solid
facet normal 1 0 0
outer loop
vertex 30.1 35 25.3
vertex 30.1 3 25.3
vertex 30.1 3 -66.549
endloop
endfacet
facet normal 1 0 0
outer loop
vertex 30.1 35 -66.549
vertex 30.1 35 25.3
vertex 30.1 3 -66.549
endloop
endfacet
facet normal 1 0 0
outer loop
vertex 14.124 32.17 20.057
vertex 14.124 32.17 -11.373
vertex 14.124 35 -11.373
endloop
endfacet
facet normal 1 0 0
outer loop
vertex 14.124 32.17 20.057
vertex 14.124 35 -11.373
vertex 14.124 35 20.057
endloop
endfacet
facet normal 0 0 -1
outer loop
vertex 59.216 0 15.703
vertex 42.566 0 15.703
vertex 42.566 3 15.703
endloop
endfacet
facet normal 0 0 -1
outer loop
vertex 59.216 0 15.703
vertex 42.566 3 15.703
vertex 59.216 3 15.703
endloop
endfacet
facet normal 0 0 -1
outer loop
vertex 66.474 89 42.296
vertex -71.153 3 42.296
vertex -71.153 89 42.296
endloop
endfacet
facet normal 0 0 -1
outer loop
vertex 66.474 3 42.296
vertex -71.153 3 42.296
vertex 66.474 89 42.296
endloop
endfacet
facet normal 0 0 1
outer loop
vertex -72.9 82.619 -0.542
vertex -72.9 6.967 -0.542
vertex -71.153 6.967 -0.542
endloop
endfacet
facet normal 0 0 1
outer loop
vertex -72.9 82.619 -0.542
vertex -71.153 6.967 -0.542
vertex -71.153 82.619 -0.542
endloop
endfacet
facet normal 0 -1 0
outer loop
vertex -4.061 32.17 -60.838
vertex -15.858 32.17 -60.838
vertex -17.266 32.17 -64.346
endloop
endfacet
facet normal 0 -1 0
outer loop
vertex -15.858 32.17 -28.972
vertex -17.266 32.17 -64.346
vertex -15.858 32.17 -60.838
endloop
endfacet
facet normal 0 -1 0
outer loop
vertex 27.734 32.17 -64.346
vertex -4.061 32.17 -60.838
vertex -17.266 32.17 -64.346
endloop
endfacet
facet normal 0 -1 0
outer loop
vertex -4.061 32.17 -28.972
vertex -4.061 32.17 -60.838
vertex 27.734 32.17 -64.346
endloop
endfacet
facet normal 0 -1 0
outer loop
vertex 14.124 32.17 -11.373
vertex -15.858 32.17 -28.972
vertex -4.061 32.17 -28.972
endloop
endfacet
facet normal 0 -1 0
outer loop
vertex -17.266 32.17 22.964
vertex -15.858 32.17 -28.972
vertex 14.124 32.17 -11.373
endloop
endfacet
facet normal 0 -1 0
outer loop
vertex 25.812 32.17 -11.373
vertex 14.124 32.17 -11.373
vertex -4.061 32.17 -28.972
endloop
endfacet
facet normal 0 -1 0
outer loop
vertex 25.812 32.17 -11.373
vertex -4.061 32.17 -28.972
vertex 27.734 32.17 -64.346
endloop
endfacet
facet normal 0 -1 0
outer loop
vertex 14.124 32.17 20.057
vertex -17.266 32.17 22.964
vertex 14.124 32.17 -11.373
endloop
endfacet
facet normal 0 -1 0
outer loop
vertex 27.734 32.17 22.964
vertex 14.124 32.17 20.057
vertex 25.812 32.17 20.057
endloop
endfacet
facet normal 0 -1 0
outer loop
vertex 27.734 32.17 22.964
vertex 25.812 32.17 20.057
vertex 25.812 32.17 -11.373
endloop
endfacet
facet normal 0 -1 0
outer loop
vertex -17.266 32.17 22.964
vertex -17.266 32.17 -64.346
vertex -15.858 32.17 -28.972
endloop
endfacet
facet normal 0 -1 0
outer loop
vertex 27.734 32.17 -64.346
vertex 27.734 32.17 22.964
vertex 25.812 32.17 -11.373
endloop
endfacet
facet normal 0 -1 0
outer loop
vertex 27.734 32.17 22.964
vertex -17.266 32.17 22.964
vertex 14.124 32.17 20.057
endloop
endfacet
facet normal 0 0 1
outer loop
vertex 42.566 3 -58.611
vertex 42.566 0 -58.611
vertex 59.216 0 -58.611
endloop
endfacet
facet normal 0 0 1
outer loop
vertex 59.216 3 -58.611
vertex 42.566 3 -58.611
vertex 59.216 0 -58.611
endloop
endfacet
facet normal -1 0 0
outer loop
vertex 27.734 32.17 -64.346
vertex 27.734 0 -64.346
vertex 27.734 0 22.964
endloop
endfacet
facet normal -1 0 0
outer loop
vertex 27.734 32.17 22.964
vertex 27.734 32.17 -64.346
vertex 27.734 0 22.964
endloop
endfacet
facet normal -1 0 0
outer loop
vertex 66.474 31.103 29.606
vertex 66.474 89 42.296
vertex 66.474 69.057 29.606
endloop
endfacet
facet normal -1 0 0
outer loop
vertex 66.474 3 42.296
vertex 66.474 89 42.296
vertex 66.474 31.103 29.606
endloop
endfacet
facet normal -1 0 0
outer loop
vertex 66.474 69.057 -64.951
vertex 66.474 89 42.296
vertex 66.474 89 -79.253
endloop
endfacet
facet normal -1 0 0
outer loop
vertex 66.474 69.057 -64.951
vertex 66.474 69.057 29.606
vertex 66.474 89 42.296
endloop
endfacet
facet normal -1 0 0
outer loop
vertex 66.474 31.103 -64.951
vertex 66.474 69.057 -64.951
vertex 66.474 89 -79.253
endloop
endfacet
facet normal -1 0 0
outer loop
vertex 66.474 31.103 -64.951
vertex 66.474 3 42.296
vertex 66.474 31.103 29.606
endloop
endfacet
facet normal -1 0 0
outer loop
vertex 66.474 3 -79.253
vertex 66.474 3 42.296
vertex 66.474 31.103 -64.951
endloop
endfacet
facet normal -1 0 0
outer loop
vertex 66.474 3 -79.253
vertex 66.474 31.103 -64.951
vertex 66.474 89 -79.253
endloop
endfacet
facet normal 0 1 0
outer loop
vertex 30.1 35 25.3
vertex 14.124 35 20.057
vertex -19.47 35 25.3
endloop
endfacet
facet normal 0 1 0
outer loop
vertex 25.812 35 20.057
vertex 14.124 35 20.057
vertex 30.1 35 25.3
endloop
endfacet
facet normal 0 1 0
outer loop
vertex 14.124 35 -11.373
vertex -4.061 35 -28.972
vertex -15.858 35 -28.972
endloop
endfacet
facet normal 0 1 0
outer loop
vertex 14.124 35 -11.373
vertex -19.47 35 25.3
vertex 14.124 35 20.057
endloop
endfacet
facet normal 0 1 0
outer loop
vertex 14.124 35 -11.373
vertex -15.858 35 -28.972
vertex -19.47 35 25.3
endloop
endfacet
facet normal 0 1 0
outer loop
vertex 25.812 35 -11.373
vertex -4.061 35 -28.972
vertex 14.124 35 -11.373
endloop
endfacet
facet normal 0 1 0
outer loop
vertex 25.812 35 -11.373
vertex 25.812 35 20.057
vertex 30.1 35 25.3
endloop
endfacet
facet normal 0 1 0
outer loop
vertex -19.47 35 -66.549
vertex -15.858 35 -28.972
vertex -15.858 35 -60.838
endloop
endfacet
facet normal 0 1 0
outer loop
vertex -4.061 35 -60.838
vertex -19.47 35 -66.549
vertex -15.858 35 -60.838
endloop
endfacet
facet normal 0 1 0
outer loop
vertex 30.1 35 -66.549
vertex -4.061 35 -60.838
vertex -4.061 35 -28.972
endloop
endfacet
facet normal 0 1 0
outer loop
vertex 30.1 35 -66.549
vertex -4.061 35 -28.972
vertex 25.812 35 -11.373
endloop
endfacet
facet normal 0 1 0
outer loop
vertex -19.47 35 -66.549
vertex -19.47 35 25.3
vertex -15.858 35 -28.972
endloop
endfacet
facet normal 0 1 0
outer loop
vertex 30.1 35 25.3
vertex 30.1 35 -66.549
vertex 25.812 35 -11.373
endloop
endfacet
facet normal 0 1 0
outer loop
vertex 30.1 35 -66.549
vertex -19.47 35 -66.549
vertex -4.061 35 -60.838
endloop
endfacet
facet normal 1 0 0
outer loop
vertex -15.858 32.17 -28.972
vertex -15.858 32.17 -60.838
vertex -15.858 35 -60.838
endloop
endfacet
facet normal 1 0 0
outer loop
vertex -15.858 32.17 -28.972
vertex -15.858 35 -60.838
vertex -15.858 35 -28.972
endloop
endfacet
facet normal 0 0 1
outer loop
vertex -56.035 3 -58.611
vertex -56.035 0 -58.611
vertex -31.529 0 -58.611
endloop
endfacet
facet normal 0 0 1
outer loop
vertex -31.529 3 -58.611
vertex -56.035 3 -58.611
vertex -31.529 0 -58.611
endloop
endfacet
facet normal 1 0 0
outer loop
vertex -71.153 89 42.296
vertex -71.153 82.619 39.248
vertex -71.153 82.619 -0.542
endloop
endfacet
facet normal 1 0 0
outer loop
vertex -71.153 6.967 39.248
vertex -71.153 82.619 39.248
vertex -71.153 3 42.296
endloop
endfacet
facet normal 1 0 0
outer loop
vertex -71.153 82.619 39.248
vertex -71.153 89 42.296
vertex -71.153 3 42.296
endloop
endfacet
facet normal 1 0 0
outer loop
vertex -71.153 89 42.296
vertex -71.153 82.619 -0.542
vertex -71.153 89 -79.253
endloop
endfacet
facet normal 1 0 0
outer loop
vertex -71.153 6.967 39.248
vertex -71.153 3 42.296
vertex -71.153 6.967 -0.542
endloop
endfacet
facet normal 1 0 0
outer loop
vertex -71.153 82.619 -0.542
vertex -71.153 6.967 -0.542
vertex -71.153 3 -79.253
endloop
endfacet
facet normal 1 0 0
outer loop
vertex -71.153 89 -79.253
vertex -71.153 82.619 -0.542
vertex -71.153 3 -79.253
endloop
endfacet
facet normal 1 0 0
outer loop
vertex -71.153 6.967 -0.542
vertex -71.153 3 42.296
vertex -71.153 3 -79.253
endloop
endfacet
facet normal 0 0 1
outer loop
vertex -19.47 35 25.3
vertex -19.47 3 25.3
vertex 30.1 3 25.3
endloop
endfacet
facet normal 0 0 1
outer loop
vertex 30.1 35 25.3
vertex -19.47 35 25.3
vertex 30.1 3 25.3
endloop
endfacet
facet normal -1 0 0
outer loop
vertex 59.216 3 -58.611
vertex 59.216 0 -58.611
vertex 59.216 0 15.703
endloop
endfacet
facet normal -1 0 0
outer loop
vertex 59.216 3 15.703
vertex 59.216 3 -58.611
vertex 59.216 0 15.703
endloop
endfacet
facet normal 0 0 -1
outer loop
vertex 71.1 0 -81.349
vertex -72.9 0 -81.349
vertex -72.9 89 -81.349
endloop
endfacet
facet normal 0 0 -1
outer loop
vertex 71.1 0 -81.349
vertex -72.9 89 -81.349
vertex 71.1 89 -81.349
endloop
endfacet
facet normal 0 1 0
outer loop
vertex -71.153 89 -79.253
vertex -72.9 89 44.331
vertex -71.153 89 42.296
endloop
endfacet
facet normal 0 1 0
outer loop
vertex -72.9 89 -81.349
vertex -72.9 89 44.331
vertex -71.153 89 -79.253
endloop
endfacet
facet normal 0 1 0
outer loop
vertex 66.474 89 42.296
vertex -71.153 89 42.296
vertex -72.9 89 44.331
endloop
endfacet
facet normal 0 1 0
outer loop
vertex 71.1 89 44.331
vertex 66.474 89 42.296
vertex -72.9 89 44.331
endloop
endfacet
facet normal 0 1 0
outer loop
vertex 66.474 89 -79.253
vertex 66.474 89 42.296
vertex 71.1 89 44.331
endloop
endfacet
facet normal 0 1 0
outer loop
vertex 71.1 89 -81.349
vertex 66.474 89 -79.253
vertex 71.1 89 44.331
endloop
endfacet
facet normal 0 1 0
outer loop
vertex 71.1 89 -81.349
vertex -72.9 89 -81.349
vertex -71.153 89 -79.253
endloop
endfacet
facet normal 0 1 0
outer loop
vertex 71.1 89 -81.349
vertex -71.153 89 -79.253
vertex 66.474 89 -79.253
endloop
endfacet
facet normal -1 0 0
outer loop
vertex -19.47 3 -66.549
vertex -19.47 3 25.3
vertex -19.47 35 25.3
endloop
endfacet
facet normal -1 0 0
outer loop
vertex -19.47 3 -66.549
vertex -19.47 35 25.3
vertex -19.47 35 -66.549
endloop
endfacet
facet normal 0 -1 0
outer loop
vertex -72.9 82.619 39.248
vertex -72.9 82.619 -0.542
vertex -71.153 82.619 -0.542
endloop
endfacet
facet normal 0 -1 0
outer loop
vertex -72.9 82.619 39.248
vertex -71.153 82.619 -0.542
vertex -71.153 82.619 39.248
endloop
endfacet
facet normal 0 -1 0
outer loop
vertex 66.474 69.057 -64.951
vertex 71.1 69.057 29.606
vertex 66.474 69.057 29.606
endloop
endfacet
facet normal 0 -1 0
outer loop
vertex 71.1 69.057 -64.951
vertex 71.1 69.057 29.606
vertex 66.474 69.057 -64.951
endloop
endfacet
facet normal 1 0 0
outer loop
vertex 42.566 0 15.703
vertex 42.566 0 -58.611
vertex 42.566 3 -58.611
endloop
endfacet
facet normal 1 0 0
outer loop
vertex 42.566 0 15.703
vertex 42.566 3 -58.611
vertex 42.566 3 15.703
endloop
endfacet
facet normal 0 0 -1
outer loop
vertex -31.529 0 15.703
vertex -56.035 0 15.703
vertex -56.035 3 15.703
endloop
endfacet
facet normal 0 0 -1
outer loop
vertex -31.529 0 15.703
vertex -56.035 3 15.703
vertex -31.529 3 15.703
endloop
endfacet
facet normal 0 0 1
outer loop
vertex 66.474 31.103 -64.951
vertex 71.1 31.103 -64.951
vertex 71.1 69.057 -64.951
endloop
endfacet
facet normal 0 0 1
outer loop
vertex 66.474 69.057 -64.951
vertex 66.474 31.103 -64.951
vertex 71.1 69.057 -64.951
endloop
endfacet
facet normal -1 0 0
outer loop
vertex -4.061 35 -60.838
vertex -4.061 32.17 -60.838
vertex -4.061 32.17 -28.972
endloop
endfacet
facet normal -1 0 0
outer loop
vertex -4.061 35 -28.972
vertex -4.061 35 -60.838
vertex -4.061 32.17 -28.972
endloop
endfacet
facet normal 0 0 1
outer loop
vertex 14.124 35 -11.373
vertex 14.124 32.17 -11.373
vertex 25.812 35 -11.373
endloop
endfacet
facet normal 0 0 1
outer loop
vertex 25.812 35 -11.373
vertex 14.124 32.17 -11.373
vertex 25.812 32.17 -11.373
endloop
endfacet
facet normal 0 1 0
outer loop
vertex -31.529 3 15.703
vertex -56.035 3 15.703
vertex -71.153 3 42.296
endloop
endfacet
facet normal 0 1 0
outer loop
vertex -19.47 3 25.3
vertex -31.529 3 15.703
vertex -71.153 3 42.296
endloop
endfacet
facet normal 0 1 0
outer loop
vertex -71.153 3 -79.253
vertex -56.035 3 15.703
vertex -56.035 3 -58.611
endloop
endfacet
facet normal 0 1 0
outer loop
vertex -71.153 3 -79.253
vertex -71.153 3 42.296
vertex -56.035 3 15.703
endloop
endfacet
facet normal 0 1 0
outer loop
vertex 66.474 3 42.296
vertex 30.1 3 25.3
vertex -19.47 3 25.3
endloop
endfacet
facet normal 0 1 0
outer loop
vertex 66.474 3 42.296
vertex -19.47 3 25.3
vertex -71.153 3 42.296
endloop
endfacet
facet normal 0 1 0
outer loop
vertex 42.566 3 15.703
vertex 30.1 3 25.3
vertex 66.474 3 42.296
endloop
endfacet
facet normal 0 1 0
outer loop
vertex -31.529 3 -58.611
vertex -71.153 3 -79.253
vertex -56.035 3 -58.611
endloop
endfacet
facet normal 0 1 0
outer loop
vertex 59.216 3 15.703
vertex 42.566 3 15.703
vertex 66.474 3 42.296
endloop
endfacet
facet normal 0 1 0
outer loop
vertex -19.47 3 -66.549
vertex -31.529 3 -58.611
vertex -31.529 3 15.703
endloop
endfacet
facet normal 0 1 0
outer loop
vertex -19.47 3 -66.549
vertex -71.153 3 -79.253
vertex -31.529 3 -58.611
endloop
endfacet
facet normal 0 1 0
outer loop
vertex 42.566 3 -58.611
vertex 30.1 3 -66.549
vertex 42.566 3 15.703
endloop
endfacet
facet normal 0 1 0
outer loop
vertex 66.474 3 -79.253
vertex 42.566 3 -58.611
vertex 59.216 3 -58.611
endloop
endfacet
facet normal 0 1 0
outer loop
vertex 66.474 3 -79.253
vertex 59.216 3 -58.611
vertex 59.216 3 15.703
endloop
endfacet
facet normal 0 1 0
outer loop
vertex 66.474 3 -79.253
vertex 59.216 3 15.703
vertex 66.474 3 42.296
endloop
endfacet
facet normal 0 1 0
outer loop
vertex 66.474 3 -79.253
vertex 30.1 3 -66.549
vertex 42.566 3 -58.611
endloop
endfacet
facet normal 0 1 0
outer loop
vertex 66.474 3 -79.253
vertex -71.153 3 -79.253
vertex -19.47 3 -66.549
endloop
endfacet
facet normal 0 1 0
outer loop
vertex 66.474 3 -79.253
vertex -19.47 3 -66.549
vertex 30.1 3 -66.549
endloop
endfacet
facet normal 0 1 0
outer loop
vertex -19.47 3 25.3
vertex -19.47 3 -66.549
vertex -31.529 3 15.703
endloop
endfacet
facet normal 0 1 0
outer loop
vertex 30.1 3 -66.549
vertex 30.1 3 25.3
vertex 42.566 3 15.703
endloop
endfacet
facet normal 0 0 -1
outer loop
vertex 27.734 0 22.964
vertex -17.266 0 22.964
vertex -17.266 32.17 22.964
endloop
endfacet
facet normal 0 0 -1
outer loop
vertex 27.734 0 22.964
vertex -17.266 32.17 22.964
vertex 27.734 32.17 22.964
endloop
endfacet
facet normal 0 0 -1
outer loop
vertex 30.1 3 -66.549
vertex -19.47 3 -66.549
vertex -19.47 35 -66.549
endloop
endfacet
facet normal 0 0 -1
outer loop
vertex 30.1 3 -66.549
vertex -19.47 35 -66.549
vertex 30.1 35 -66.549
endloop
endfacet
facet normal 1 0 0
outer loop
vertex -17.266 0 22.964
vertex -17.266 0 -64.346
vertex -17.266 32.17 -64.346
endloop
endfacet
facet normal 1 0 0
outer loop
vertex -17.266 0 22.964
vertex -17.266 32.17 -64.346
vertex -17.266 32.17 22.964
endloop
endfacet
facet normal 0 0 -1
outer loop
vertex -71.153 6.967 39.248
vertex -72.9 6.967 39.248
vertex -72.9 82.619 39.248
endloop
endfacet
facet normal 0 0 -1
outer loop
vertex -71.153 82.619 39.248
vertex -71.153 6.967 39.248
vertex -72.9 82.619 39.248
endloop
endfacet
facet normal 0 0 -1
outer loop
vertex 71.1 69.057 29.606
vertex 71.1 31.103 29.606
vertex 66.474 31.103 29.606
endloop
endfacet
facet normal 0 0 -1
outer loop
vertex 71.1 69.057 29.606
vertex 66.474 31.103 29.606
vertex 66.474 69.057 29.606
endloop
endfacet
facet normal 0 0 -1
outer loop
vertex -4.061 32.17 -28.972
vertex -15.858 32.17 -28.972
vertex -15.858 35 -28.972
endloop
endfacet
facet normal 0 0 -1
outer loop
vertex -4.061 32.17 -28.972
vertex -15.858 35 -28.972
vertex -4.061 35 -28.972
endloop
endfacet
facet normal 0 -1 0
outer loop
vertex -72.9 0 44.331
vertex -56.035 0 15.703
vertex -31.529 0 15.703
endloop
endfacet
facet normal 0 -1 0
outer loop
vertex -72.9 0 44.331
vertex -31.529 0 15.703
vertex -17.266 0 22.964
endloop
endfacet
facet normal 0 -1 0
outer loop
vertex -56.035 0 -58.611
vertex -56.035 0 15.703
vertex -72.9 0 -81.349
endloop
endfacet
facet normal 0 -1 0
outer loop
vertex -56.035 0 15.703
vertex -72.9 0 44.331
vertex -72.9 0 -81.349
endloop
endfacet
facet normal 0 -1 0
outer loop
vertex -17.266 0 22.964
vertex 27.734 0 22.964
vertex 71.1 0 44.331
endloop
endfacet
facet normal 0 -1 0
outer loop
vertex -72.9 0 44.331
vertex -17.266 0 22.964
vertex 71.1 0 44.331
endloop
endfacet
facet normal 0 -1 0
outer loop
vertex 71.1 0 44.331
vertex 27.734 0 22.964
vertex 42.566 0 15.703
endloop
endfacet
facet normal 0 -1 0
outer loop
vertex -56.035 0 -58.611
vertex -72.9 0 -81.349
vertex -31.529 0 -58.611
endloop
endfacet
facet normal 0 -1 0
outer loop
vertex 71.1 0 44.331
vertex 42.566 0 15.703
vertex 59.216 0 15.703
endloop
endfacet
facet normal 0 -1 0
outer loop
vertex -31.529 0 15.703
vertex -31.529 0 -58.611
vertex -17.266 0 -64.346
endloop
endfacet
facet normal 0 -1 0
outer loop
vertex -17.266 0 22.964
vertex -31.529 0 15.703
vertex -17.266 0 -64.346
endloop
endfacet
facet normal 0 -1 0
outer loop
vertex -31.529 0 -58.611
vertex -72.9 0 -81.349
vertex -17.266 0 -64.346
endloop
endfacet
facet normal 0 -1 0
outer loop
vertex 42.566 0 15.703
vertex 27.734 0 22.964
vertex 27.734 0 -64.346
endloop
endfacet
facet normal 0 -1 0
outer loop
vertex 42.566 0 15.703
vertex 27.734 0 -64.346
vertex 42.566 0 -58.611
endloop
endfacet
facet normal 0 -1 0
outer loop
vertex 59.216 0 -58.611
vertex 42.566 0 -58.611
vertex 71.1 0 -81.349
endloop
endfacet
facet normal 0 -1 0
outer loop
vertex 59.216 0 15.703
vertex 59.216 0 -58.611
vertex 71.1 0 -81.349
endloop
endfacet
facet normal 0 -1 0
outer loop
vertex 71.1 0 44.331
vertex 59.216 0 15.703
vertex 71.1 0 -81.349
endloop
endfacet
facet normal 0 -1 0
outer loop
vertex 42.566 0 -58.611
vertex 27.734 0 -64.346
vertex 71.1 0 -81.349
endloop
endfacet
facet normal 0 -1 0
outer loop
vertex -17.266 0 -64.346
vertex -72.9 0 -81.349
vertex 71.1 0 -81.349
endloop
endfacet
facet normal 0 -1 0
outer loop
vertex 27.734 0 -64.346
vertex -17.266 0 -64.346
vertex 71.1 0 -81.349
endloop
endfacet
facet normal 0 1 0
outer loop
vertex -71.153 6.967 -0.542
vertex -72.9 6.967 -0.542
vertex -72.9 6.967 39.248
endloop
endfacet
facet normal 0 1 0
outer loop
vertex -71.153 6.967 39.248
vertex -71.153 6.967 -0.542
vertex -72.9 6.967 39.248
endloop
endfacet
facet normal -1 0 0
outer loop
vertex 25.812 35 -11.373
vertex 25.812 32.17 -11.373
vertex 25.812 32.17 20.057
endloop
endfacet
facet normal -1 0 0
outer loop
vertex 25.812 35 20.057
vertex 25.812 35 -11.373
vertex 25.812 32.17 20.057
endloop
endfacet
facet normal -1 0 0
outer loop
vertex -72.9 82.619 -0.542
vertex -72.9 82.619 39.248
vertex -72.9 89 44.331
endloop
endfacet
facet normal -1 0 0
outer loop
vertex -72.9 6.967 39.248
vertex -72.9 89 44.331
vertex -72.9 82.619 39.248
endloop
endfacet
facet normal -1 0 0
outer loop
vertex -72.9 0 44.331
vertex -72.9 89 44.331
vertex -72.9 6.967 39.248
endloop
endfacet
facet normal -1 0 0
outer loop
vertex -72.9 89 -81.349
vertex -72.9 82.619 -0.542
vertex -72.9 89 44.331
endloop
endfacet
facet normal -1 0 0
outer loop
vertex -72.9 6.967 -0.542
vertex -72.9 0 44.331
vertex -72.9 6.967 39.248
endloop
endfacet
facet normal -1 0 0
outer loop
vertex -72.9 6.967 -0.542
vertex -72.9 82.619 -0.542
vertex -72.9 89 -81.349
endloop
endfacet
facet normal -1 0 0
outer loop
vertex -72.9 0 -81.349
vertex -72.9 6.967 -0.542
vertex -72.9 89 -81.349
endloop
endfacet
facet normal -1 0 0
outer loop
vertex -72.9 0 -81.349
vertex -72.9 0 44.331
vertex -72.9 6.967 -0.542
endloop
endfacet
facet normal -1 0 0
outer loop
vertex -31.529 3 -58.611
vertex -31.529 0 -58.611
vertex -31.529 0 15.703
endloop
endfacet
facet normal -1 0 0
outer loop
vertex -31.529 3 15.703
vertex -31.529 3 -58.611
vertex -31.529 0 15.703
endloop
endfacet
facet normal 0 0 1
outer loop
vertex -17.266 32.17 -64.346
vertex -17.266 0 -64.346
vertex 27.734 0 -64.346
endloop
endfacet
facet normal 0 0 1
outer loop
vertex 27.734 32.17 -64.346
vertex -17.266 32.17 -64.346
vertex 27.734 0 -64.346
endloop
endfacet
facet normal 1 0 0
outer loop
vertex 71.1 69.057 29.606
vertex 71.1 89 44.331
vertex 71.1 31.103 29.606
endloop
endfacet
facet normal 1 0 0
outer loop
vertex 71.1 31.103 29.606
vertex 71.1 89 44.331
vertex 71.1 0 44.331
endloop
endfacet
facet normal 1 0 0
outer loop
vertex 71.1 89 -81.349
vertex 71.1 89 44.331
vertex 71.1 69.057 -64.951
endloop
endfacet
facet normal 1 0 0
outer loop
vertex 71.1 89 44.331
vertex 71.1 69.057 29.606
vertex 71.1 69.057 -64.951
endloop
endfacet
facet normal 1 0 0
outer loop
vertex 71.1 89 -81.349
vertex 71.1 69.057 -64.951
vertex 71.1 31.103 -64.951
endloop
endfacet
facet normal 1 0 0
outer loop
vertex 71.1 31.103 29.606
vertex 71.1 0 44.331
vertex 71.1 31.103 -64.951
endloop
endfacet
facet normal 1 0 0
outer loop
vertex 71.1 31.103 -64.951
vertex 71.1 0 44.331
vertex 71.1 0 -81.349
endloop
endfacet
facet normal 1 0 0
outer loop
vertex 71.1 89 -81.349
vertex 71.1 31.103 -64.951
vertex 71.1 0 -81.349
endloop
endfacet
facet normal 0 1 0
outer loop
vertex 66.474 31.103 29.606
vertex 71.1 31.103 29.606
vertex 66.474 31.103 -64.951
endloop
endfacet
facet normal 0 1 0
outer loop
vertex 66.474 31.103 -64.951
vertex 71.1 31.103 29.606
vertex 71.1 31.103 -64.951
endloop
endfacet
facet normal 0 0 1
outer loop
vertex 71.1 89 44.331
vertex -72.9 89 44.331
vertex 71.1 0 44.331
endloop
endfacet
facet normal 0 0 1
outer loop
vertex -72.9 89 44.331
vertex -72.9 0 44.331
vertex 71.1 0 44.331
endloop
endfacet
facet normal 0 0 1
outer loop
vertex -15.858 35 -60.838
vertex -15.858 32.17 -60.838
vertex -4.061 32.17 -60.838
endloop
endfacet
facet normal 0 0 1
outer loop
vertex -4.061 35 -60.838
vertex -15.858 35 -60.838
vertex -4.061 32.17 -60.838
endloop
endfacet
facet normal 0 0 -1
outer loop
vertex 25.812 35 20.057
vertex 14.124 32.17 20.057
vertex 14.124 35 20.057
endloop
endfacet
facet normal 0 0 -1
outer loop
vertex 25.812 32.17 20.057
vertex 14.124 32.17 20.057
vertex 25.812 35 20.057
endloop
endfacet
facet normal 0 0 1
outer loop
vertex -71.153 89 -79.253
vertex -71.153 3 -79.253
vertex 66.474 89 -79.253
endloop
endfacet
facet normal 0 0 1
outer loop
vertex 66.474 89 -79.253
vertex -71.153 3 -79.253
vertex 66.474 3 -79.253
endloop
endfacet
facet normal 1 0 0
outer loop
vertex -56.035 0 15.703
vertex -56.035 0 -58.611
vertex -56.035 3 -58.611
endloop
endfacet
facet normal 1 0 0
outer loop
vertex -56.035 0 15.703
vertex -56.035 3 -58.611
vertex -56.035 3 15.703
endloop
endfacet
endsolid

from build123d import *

# Parameters (mm, degrees)
SKETCH1_W           = 144
SKETCH1_H           = 125.68
BOSS_EXTRUDE1_DEPTH = 3
SKETCH2_W           = 144
SKETCH2_H           = 125.68
SKETCH2_W_2         = 137.62694519
SKETCH2_H_2         = 121.548177757
BOSS_EXTRUDE2_DEPTH = 86
SKETCH4_W           = 94.55727782
SKETCH4_H           = 37.953937335
CUT_EXTRUDE1_DEPTH  = 20
SKETCH6_W           = 39.790164022
SKETCH6_H           = 75.651590962
CUT_EXTRUDE3_DEPTH  = 20
SKETCH8_W           = 49.5692413
SKETCH8_H           = 91.849069086
BOSS_EXTRUDE3_DEPTH = 32
SKETCH7_W           = 45
SKETCH7_H           = 87.31
CUT_EXTRUDE4_DEPTH  = 32.17
SKETCH9_W           = 11.79717637
SKETCH9_H           = 31.86635219
CUT_EXTRUDE5_DEPTH  = 40
SKETCH10_W          = 11.687827299
SKETCH10_H          = 31.429738741
CUT_EXTRUDE6_DEPTH  = 40
SKETCH11_W          = 16.650134538
SKETCH11_H          = 74.314635754
SKETCH11_W_2        = 24.505886262
CUT_EXTRUDE7_DEPTH  = 40


with BuildPart() as part:
    # Sketch1 → Boss-Extrude1 (new body)
    with BuildSketch(Plane(origin=(0, 0, 0), x_dir=(1, 0, 0), z_dir=(0, 1, 0))):
        with Locations((-0.900426333, 18.508659662)):
            Rectangle(SKETCH1_W, SKETCH1_H)
    extrude(amount=BOSS_EXTRUDE1_DEPTH)

    # Sketch2 → Boss-Extrude2 (add)
    with BuildSketch(Plane(origin=(0, 3, 0), x_dir=(1, 0, 0), z_dir=(0, 1, 0))):
        with Locations((-0.900426333, 18.508659662)):
            Rectangle(SKETCH2_W, SKETCH2_H)
        with Locations((-2.339827632, 18.478566742)):
            Rectangle(SKETCH2_W_2, SKETCH2_H_2, mode=Mode.SUBTRACT)
    extrude(amount=BOSS_EXTRUDE2_DEPTH)

    # Sketch4 → Cut-Extrude1 (cut)
    with BuildSketch(Plane(origin=(71.099573667, 0, 0), x_dir=(0, 0, -1), z_dir=(1, 0, 0))):
        with Locations((17.672764627, 50.079604952)):
            Rectangle(SKETCH4_W, SKETCH4_H)
    extrude(amount=-CUT_EXTRUDE1_DEPTH, mode=Mode.SUBTRACT)

    # Sketch6 → Cut-Extrude3 (cut)
    with BuildSketch(Plane.ZY.offset(72.900426333)):
        with Locations((19.353212204, 44.793227562)):
            Rectangle(SKETCH6_W, SKETCH6_H)
    extrude(amount=-CUT_EXTRUDE3_DEPTH, mode=Mode.SUBTRACT)

    # Sketch8 → Boss-Extrude3 (add)
    with BuildSketch(Plane(origin=(0, 3, 0), x_dir=(1, 0, 0), z_dir=(0, 1, 0))):
        with Locations((5.315093732, 20.62475692)):
            Rectangle(SKETCH8_W, SKETCH8_H)
    extrude(amount=BOSS_EXTRUDE3_DEPTH)

    # Sketch7 → Cut-Extrude4 (cut)
    with BuildSketch(Plane.XZ):
        with Locations((5.233997278, -20.691377503)):
            Rectangle(SKETCH7_W, SKETCH7_H)
    extrude(amount=-CUT_EXTRUDE4_DEPTH, mode=Mode.SUBTRACT)

    # Sketch9 → Cut-Extrude5 (cut)
    with BuildSketch(Plane.XZ.offset(-32.17)):
        with Locations((-9.959298471, -44.905011983)):
            Rectangle(SKETCH9_W, SKETCH9_H)
    extrude(amount=-CUT_EXTRUDE5_DEPTH, mode=Mode.SUBTRACT)

    # Sketch10 → Cut-Extrude6 (cut)
    with BuildSketch(Plane.XZ.offset(-32.17)):
        with Locations((19.967671673, 4.341983418)):
            Rectangle(SKETCH10_W, SKETCH10_H)
    extrude(amount=-CUT_EXTRUDE6_DEPTH, mode=Mode.SUBTRACT)

    # Sketch11 → Cut-Extrude7 (cut)
    with BuildSketch(Plane.XZ):
        with Locations((50.891184892, -21.453909531)):
            Rectangle(SKETCH11_W, SKETCH11_H)
        with Locations((-43.781754887, -21.453909531)):
            Rectangle(SKETCH11_W_2, SKETCH11_H)
    extrude(amount=-CUT_EXTRUDE7_DEPTH, mode=Mode.SUBTRACT)


solid = part.part
